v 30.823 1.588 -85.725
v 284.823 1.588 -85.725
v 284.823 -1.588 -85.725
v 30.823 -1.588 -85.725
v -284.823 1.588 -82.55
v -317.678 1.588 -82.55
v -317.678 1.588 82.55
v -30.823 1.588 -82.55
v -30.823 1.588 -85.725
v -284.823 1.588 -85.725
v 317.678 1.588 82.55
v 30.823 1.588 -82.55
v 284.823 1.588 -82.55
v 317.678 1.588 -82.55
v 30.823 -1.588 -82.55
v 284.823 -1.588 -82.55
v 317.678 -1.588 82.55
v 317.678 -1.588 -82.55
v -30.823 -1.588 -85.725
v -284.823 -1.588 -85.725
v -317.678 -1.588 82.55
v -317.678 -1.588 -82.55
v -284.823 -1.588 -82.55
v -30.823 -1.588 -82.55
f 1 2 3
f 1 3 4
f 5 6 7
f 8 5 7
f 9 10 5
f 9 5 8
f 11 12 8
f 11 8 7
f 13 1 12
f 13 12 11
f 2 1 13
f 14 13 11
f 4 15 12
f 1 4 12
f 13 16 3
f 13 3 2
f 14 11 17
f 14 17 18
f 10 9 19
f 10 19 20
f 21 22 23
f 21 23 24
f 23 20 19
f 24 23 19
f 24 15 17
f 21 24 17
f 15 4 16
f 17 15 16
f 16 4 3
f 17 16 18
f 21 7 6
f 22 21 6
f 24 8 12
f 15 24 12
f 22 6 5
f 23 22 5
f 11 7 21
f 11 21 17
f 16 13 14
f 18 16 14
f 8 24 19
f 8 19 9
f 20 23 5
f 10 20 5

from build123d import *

# Parameters (mm, degrees)
SKETCH1_W           = 635.3556
SKETCH1_H           = 165.1
BOSS_EXTRUDE1_DEPTH = 1.5875
SKETCH2_W           = 254
SKETCH2_H           = 3.175
BOSS_EXTRUDE2_DEPTH = 3.175


with BuildPart() as part:
    # Sketch1 → Boss-Extrude1 (new, symmetric)
    with BuildSketch(Plane(origin=(0, 0, 0), x_dir=(1, 0, 0), z_dir=(0, 1, 0))):
        Rectangle(SKETCH1_W, SKETCH1_H)
    extrude(amount=BOSS_EXTRUDE1_DEPTH, both=True)

    # Sketch2 → Boss-Extrude2 (add)
    with BuildSketch(Plane(origin=(0, 0, -82.55), x_dir=(-1, 0, 0), z_dir=(0, 0, -1))):
        with Locations((-157.8229, 0)):
            Rectangle(SKETCH2_W, SKETCH2_H)
        with Locations((157.8229, 0)):
            Rectangle(SKETCH2_W, SKETCH2_H)
    extrude(amount=BOSS_EXTRUDE2_DEPTH)


solid = part.part
